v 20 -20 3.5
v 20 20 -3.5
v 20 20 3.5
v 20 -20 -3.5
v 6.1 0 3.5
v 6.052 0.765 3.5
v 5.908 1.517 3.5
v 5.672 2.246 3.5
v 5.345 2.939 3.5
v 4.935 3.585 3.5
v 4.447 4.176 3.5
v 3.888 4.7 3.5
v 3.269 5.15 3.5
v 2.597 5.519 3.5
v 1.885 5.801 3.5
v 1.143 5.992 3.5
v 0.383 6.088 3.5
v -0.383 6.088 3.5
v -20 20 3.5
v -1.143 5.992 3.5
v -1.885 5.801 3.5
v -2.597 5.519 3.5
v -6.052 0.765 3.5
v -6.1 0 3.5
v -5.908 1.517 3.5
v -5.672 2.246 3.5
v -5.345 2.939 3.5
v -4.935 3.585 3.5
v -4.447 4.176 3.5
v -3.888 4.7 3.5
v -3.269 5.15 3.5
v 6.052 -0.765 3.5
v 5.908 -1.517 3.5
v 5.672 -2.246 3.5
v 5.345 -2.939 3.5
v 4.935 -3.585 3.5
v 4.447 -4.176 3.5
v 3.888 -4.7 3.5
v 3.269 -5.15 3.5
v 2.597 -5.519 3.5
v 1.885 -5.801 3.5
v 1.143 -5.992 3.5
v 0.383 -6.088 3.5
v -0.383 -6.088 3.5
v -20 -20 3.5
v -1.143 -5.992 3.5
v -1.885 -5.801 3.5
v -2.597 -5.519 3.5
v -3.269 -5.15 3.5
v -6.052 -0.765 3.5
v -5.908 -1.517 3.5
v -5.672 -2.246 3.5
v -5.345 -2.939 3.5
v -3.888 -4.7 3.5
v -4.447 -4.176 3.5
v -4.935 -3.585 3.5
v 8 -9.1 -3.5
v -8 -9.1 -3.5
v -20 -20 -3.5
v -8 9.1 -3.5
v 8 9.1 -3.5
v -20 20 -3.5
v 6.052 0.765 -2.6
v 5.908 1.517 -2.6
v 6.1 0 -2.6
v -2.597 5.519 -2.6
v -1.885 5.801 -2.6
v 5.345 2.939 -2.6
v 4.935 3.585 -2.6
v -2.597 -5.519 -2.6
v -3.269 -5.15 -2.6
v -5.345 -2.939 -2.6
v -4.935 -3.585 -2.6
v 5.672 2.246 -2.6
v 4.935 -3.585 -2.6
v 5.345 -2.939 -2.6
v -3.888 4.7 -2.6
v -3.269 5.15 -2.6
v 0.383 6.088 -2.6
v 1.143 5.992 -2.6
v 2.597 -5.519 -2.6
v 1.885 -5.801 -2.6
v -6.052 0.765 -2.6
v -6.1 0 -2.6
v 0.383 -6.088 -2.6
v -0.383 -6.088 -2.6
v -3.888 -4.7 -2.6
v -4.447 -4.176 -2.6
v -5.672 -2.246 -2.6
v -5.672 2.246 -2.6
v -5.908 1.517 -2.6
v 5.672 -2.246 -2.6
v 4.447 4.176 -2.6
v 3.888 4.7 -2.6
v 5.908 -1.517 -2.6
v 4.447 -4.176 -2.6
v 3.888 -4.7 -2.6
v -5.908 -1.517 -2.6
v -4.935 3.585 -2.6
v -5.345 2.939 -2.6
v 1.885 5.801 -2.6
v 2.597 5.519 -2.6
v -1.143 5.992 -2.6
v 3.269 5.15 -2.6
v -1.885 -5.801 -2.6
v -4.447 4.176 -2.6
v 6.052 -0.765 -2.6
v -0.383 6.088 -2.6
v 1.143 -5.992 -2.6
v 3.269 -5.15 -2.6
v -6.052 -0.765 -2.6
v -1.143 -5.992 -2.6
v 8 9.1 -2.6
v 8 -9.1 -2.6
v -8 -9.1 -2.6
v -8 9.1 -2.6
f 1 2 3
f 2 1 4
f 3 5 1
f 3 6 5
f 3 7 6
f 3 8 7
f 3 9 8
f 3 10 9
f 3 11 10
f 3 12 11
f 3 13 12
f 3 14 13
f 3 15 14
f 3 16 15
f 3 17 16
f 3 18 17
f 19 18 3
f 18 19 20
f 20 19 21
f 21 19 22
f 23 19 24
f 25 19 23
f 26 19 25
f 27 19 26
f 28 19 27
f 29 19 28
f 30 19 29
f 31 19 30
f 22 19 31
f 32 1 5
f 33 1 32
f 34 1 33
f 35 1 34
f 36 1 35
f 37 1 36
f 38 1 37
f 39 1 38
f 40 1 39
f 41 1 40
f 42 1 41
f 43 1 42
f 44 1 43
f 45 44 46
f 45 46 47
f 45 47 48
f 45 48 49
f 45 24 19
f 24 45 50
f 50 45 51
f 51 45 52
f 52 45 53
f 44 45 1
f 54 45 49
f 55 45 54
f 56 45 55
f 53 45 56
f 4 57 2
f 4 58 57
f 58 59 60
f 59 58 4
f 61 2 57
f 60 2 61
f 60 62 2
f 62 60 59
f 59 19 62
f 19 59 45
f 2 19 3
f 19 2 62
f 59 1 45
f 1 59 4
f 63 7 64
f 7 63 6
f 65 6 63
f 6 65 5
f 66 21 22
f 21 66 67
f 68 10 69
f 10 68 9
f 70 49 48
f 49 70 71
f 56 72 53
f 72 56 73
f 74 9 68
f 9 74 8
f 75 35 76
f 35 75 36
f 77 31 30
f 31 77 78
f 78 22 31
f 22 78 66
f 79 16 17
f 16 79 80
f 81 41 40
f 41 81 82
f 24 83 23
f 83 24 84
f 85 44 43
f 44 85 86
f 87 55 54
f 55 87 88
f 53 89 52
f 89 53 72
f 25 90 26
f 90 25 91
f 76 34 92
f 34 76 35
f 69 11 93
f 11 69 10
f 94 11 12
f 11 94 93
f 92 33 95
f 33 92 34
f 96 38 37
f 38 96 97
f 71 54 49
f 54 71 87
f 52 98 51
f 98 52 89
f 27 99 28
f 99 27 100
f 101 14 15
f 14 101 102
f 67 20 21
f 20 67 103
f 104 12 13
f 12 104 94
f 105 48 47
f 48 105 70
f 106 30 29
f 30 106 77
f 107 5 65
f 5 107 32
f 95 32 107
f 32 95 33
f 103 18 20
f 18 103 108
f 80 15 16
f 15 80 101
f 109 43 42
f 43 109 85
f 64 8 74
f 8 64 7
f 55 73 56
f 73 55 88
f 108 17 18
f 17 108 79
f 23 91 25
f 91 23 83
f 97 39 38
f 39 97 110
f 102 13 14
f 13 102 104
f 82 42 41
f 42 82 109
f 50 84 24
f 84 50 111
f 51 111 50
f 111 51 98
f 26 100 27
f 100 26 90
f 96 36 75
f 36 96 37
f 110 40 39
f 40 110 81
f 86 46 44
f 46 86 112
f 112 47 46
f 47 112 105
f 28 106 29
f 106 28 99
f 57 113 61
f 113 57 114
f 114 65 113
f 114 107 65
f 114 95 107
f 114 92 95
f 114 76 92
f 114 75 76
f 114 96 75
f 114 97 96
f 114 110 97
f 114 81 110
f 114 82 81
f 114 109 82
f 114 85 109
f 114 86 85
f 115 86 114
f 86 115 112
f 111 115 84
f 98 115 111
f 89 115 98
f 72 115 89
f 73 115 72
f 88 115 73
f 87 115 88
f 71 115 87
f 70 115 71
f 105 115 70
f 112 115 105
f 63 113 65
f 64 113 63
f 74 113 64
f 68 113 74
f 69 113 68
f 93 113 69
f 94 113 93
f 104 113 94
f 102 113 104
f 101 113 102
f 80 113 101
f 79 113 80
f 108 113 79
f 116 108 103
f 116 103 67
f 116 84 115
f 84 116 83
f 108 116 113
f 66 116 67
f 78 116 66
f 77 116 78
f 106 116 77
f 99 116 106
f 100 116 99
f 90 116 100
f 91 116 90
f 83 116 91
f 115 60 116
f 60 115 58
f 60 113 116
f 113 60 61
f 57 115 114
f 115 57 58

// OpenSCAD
// file: ../robot_settings.scad
main_box_x = 95; // 96
main_box_y = 102;
main_box_z = 74; // 74.5
wall_thickness = 2;

rail_gap = 2;
rail_inset = 7;

rail_thickness = 7;
rail_length = 250;
rail_width = 200;

raspberry_pi_screw_seperation_y = 57;
raspberry_pi_screw_seperation_z = 48;
raspberry_pi_peg_h = 5;

battery_box_peg_h = 6;
battery_box_peg_d = 8;
battery_box_peg_cutout = 5;

gears_module = 1;
pinion_gear_teeth = 32;
pinion_gear_width = 5;
pinion_gear_bore = 8;

gears_setback_distance = 25;
gear_post_height = 2 * pinion_gear_width + rail_thickness + 8 ;

steering_motor_mount_x = 45;
steering_motor_mount_y = 36;
steering_motor_mount_z = 18;
steering_motor_mount_setback_distance = gears_setback_distance + 16;

dc_motor_drivertype = "Teyleten"; // Teyleten
isAdafruit = (dc_motor_drivertype == "Adafruit");

drv8871_x = isAdafruit ? 20.3 : 21.6;
drv8871_y = isAdafruit ?  24 : 25;

drv8871_z = 2;
drv8871_screw_d = 2.5;
drv8871_solder_points_z = 2;

drv8871mount_edge_x = 1.5;
drv8871mount_edge_wall = 3;
drv8871mount_z = 5;
drv8871mount_x = drv8871_x +  drv8871mount_edge_wall - 2* drv8871mount_edge_x;
drv8871mount_y = 19;

drv8871_screw_distance = 15.64;
drv8871_solder_points_d = 1.66;
drv8871_solder_offset_y = 4.4;
drv8871_solder_inner_points_distance = 5;
drv8871_solder_outer_points_distance = 12;

dc_motor_housing_minus_encoder_z = 48;
dc_motor_encoder_z = 9.33;
dc_motor_encoder_wheel_d = 13.4;
dc_motor_encoder_wheel_thickness = 5;
dc_motor_encoder_wheel_gap = 3;
dc_motor_encoder_circuit_thickness = 2;
dc_motor_cutout_d = 24.8;
dc_motor_cutout_z = 19.5;

dc_motor_screw_head_z = 2;
dc_motor_screw_head_d = 5.6;
dc_motor_screw_d = 3.2;
dc_motor_screw_offset = 8.5;

dc_motor_axle_ring_z = 3;
dc_motor_axle_ring_d = 7.2;
dc_motor_axle_cutout_d = 4.5;
dc_motor_axle_cutout_z = 10;
dc_motor_axle_notch_cutout = 0.4;
dc_motor_axle_notch_cutout_z = 6;

pdmount_x = 20;
pdmount_y = 30;
pdmount_z = 2;
pdmount_edge_x = 1.5;
pdmount_edge_wall = 3;

steering_shaft_z = 45;
steering_shaft_d = 7;
steering_shaft_motor_fitting_d = 9;
coupler_length = 24.6;
coupler_diameter = 14;
coupler_screw_d = 4;
coupler_screw_z_offset = 5;
coupler_gear_side_insert = 12.6;
steering_shaft_with_coupler_z = steering_shaft_z - coupler_gear_side_insert;

lidar_mount_y = 110;
lidar_mount_x = 65 + 20;
lidar_narrow_screws = 40;
lidar_wide_screws = 56;
lidar_front_to_back_screws = 70;
lidar_screw_d = 3;
lidar_circuitboard_x = 20;
lidar_circuitboard_y = 35;
lidar_circuitboard_z = 1.2;
lidar_cord_length = 29;

ball_bearing_height = 7;
ball_bearing_outer_diameter = 22;
ball_bearing_inner_diameter = 8;

 armature_holder_height = 20;
 armature_holder_thickness = 8;
pull_bar_peg_r = 3.2;
apparatus_locking_peg_d = 4;

rack_module = 1;
rack_length = main_box_x / 2;
rack_height = 10;
rack_width = 10;
rack_teeth = 30;
rack_bore = 3;

pull_bar_length = rail_width / 2 - rack_length + 1;

// tire hardware
axle_length = 30;
axle_reciever_inner_diameter = 7.75;
axle_reciever_length = 18.8;
axle_notch_length = 7;
axle_notch_cutout = 2.4;

// power distribution bar
power_bar_cutout_x = 96;
power_bar_y = 19.1;
power_bar_z = 1.5;
power_bar_screw_distance = 91.4;
power_bar_screw_d = 2.8;
power_bar_standoff_z = 5;
power_bar_standoff_d = 6.83;

// breadboard
breadboard_wall_thickness = 3;
breadboard_width = 55;
breadboard_length = 83;
breadboard_height = 10.5;
breadboard_notch_width = 4.2;
breadboard_longside_notch_separation = 58.2 - breadboard_notch_width / 2;
breadboard_shortside_notch_separation = 26.3 - breadboard_notch_width;

pico_expander_width = 63;
pico_expander_height = 57;
pico_screw_hole_offset = 3;
pico_screw_hole_d = 2.5;

usbhub_thickness = 11.7;
usbhub_depth = 37.5;
usbhub_width = 86.7;
usbhub_end_port_width = 14.8;
usbhub_end_port_height = 12;
usbhub_front_face_safe_zone_left = 15;
usbhub_front_face_safe_zone_right = 14.8;

switch_w = 16;
switch_cutout_d = 12.2;
switch_bump_h = 2;
switch_bump_l = 18.2;
// main file
include <../robot_settings.scad>
$fn = 50;

difference() {
cube([40, 40, rail_thickness], center = true);


      // switch cutout
      translate([0, 0, - rail_thickness + 2])
      cylinder(rail_thickness + 4, d = switch_cutout_d);
      
      // switch bump cutout
      color("green")
      translate([0, 0, - rail_thickness + 1.7 * switch_bump_h])
      cube([switch_w, switch_bump_l,  switch_bump_h], center = true);
}
